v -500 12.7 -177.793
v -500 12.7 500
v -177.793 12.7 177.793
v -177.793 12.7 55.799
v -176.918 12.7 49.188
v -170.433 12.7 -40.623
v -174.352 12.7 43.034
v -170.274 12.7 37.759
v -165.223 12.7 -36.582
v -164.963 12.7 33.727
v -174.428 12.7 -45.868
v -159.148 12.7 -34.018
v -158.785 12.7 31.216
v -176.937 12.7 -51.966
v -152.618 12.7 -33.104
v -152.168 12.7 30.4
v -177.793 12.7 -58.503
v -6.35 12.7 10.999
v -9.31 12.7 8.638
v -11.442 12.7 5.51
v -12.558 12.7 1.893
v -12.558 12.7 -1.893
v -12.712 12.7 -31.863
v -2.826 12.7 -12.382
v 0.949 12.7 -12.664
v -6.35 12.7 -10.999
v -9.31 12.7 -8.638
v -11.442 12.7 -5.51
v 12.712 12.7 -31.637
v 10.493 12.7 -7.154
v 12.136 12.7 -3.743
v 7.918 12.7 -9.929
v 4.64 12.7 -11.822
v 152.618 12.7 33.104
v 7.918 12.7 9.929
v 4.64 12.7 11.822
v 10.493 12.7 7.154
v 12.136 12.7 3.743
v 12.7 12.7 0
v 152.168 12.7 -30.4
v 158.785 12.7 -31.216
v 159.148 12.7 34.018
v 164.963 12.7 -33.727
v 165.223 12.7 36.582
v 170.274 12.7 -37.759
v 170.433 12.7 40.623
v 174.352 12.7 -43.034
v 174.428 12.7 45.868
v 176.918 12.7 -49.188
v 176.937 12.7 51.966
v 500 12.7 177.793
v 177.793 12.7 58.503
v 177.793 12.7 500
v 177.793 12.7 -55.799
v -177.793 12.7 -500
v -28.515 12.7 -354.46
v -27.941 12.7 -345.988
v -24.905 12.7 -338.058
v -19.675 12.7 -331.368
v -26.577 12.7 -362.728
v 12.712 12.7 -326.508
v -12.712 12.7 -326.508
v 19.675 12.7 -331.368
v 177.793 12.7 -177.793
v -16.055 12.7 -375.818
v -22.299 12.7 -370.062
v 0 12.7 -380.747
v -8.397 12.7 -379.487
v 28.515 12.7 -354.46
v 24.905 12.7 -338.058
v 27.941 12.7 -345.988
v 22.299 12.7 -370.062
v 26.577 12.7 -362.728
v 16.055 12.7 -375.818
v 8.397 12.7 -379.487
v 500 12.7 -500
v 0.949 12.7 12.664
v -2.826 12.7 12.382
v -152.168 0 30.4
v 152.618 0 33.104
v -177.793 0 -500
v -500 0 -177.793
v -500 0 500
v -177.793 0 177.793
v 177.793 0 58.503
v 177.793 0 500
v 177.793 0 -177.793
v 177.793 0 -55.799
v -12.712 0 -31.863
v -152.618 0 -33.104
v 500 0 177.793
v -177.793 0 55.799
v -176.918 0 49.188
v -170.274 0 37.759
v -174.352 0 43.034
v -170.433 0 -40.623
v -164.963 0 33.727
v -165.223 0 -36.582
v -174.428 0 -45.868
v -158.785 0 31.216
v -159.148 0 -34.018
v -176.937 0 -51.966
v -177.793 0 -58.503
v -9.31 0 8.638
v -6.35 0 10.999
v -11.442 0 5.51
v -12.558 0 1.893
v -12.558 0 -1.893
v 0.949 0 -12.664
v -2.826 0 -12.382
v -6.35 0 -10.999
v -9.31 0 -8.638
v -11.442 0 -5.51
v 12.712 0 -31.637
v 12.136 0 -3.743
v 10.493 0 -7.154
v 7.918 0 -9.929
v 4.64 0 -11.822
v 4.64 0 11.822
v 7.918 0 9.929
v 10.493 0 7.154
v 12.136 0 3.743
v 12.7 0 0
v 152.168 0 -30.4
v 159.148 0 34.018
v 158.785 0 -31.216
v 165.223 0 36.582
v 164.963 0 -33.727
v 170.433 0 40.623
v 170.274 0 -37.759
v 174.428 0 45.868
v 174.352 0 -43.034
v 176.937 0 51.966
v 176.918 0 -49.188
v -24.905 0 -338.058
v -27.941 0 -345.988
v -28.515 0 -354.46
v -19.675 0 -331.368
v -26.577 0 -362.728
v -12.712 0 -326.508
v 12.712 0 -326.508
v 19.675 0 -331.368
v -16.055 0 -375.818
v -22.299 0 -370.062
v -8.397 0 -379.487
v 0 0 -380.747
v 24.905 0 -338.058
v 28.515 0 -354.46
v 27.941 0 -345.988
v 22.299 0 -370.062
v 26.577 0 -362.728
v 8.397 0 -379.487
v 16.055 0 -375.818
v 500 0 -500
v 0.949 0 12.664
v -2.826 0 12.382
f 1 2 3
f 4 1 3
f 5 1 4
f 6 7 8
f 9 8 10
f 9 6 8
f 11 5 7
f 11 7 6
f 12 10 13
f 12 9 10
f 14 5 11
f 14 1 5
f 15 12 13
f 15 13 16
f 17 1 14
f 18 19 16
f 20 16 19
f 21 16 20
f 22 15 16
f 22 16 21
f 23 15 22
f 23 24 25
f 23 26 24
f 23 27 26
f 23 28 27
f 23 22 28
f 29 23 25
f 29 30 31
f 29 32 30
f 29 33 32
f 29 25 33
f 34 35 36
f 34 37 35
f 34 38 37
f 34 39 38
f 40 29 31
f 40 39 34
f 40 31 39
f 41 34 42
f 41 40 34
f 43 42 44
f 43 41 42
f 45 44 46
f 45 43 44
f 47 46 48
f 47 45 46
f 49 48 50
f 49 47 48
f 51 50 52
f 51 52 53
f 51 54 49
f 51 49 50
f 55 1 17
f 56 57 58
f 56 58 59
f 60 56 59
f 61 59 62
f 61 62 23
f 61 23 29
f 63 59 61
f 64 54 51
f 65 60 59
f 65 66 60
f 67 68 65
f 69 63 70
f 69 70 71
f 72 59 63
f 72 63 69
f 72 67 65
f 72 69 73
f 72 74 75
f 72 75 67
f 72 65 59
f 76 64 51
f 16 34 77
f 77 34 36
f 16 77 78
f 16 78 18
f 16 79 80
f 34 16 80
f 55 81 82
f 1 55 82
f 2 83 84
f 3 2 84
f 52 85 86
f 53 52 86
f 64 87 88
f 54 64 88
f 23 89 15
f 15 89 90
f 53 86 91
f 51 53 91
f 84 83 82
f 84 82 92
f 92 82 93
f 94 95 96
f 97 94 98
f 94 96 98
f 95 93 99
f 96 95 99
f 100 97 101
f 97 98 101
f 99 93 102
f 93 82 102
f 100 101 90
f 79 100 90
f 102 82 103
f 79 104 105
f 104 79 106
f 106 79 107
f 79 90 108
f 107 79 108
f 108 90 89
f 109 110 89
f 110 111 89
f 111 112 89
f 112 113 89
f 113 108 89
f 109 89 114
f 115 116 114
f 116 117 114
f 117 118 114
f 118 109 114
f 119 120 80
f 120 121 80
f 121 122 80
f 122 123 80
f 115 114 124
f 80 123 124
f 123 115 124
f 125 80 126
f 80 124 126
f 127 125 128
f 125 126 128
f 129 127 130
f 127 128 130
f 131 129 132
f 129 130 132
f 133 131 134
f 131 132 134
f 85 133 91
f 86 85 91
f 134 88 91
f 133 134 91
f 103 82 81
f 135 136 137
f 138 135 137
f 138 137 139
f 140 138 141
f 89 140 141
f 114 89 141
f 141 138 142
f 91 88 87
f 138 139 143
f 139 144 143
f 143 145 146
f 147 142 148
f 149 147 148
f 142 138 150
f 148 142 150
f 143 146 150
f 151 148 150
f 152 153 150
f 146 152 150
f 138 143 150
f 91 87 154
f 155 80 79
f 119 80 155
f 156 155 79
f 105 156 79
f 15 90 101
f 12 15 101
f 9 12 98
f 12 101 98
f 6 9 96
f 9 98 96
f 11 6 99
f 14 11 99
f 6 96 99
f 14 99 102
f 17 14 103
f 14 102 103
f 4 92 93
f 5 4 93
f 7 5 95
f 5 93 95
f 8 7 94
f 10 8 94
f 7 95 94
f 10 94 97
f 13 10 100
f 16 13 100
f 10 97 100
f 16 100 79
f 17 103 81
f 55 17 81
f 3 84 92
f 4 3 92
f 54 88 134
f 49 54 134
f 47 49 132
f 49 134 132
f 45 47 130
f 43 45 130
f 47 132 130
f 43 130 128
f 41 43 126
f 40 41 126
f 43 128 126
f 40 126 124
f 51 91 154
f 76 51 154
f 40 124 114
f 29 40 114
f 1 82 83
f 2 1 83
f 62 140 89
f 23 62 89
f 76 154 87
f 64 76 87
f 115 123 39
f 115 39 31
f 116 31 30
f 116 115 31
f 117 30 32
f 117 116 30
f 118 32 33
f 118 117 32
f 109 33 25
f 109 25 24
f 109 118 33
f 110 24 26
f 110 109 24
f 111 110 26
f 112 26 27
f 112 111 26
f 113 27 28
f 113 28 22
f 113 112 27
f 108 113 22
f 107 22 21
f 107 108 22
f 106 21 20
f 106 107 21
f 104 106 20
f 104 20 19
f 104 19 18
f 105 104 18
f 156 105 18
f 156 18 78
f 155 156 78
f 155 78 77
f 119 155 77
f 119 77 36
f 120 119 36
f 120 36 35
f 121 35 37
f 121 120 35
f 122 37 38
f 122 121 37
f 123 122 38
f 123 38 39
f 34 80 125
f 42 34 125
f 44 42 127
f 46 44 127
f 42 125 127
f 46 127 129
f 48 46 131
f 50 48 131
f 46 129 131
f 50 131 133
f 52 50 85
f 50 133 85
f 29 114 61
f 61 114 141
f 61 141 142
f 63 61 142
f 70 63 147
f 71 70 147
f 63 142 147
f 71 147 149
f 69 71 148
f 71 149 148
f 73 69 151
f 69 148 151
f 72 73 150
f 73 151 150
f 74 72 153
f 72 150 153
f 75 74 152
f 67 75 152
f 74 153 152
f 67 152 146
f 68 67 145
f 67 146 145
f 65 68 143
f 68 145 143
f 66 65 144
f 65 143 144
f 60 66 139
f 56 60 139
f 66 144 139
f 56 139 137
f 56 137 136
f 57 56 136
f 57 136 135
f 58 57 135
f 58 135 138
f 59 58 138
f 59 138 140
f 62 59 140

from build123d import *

# Parameters (mm, degrees)
SKETCH1_R           = 12.7
BOSS_EXTRUDE1_DEPTH = 12.7


with BuildPart() as part:
    # Sketch1 → Boss-Extrude1 (new body)
    with BuildSketch(Plane(origin=(0, 0, 0), x_dir=(1, 0, 0), z_dir=(0, 1, 0))):
        with BuildLine():
            ThreePointArc((-177.79300078, -55.798766176), (-170.27365382, -37.758748247), (-152.16762701, -30.399766064))
            Line((-152.16762701, -30.399766064), (152.618374551, -33.104233568))
            ThreePointArc((152.618374551, -33.104233568), (170.43301871, -40.622580641), (177.79300078, -58.50323368))
            Line((177.79300078, -58.50323368), (177.79300078, -500))
            Line((177.79300078, -500), (500, -177.79300078))
            Line((500, -177.79300078), (500, 500))
            Line((500, 500), (177.79300078, 177.79300078))
            Line((177.79300078, 177.79300078), (177.79300078, 55.798766176))
            ThreePointArc((177.79300078, 55.798766176), (170.27365382, 37.758748247), (152.16762701, 30.399766064))
            Line((152.16762701, 30.399766064), (12.711649925, 31.637205305))
            Line((12.711649925, 31.637205305), (12.711649925, 326.507694892))
            ThreePointArc((12.711649925, 326.507694892), (0, 380.747448982), (-12.711649925, 326.507694892))
            Line((-12.711649925, 326.507694892), (-12.711649925, 31.862794695))
            Line((-12.711649925, 31.862794695), (-152.618374551, 33.104233568))
            ThreePointArc((-152.618374551, 33.104233568), (-170.43301871, 40.62258064), (-177.79300078, 58.50323368))
            Line((-177.79300078, 58.50323368), (-177.79300078, 500))
            Line((-177.79300078, 500), (-500, 177.79300078))
            Line((-500, 177.79300078), (-500, -500))
            Line((-500, -500), (-177.79300078, -177.79300078))
            Line((-177.79300078, -177.79300078), (-177.79300078, -55.798766176))
        make_face()
        Circle(SKETCH1_R, mode=Mode.SUBTRACT)
    extrude(amount=BOSS_EXTRUDE1_DEPTH)


solid = part.part
